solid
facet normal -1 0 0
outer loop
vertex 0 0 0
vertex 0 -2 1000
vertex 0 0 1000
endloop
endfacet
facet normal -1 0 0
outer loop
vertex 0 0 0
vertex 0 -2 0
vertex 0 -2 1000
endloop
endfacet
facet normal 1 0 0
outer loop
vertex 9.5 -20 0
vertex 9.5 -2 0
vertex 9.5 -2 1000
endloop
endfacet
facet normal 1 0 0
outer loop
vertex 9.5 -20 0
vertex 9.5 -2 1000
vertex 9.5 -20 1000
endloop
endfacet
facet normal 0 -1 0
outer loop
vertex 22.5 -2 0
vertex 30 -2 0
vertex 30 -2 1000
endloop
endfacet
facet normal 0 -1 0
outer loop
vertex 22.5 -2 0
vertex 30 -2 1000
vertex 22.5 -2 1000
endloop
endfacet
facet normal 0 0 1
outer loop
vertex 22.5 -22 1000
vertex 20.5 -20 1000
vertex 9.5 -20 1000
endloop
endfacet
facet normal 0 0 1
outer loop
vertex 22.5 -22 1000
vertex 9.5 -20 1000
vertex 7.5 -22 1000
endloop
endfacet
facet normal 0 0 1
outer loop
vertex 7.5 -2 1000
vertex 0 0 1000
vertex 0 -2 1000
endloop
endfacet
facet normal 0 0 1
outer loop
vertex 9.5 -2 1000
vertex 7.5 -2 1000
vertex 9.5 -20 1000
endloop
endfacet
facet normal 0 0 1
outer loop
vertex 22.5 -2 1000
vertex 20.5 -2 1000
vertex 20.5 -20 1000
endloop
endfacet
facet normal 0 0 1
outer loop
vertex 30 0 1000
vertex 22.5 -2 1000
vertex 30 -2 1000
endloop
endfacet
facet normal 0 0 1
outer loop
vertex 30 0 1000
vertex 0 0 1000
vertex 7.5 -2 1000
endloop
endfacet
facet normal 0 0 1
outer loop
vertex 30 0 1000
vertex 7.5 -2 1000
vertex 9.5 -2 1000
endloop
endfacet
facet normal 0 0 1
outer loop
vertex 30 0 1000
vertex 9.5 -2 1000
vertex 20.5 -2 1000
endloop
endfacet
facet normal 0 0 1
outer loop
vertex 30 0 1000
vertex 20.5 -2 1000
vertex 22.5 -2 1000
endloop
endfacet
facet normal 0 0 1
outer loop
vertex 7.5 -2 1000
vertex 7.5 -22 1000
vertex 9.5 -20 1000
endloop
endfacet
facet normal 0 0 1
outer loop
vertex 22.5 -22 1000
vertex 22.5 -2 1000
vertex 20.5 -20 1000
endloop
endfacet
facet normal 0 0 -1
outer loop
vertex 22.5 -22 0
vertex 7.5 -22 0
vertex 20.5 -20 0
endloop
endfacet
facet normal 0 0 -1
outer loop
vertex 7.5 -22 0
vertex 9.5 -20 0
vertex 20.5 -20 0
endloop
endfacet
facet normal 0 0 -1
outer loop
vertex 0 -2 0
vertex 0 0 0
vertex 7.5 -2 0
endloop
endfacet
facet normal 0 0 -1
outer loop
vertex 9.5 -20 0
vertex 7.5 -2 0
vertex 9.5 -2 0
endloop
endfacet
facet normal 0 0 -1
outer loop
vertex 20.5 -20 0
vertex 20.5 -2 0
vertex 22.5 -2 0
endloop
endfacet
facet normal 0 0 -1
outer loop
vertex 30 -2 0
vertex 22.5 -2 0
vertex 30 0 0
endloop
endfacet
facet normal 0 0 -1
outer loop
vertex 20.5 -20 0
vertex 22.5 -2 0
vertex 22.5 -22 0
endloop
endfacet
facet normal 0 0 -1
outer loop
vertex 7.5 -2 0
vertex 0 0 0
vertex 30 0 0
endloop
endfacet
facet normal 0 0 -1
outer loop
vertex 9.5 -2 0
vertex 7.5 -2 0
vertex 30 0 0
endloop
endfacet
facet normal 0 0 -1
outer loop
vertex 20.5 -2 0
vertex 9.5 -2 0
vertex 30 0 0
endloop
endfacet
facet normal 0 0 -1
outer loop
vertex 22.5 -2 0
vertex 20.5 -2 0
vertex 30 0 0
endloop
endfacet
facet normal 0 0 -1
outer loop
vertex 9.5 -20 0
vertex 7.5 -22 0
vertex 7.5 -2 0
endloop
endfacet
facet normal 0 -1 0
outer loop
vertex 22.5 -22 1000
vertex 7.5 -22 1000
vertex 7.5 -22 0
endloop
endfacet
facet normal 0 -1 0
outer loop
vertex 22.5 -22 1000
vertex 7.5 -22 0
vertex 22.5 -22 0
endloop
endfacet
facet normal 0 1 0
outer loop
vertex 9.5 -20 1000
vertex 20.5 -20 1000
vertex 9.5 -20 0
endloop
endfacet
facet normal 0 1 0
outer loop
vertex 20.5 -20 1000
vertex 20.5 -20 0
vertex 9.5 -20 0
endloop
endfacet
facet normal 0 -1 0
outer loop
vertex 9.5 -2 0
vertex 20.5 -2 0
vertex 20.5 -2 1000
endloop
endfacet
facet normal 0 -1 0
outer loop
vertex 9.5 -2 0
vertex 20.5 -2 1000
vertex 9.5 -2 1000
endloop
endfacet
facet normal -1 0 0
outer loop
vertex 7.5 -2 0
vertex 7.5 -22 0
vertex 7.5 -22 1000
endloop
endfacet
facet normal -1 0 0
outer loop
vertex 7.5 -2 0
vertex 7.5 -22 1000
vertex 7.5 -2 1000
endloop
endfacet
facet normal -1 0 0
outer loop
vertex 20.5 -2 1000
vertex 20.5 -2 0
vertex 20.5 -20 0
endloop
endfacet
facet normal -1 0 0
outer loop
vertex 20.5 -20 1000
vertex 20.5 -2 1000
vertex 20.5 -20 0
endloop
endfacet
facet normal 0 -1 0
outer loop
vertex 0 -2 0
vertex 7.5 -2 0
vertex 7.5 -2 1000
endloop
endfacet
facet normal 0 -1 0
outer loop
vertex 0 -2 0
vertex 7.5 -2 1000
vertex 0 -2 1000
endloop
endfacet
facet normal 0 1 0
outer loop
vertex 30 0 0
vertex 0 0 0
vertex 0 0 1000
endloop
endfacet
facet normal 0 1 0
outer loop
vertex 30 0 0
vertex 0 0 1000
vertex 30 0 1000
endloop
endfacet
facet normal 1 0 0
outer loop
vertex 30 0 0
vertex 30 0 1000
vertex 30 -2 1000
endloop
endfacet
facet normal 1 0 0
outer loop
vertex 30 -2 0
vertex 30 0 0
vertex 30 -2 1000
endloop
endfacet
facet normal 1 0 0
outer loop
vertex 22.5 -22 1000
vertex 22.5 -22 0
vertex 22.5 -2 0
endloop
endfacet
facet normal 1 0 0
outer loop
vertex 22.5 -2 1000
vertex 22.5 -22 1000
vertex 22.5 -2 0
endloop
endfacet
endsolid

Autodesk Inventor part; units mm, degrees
ref_plane "YZ Plane" through (0, 0, 0) normal (1, 0, 0) x (0, 1, 0)
ref_plane "XZ Plane" through (0, 0, 0) normal (0, 1, 0) x (-1, 0, 0)
ref_plane "XY Plane" through (0, 0, 0) normal (0, 0, 1) x (1, 0, 0)
sketch "Skizze1" plane through (0, 0, 0) normal (0, 0, 1) x (1, 0, 0)
  line L0 (0, 0) -> (30, 0)
  line L1 (30, 0) -> (30, -2)
  line L2 (30, -2) -> (0, -2)
  line L3 (0, -2) -> (0, 0)
  line L4 (7.5, -2) -> (9.5, -2)
  line L5 (9.5, -2) -> (9.5, -22)
  line L6 (9.5, -22) -> (7.5, -22)
  line L7 (7.5, -22) -> (7.5, -2)
  line L8 (9.5, -22) -> (20.5, -22)
  line L9 (20.5, -22) -> (20.5, -20)
  line L10 (20.5, -20) -> (9.5, -20)
  line L11 (9.5, -20) -> (9.5, -22)
  line L12 (20.5, -22) -> (22.5, -22)
  line L13 (22.5, -22) -> (22.5, -2)
  line L14 (22.5, -2) -> (20.5, -2)
  line L15 (20.5, -2) -> (20.5, -22)
  line L16 (15, -20) -> (15, -2) construction
  point P0 (20.5, -2)
  point P1 (9.5, -2)
  dimension "d0" = 30
  dimension "d1" = 2
  dimension "d2" = 2
  dimension "d3" = 20
  dimension "d4" = 11
  dimension "d5" = 2
  dimension "d6" = 2
  dimension "d7" = 7.5
  dimension "d8" = 20.5
  dimension "d9" = 20
  dimension "d12" = 7.5
extrude "Extrusion1" add sketch "Skizze1" along normal blind 1000 contours L0 L1 L2 L3 | L2 L5 L6 L7 | L13 L12 L9 L15 L2 | L10 L9 L8 L5
properties part number "TrägerUI" material "Aluminium 6061, Katze"
